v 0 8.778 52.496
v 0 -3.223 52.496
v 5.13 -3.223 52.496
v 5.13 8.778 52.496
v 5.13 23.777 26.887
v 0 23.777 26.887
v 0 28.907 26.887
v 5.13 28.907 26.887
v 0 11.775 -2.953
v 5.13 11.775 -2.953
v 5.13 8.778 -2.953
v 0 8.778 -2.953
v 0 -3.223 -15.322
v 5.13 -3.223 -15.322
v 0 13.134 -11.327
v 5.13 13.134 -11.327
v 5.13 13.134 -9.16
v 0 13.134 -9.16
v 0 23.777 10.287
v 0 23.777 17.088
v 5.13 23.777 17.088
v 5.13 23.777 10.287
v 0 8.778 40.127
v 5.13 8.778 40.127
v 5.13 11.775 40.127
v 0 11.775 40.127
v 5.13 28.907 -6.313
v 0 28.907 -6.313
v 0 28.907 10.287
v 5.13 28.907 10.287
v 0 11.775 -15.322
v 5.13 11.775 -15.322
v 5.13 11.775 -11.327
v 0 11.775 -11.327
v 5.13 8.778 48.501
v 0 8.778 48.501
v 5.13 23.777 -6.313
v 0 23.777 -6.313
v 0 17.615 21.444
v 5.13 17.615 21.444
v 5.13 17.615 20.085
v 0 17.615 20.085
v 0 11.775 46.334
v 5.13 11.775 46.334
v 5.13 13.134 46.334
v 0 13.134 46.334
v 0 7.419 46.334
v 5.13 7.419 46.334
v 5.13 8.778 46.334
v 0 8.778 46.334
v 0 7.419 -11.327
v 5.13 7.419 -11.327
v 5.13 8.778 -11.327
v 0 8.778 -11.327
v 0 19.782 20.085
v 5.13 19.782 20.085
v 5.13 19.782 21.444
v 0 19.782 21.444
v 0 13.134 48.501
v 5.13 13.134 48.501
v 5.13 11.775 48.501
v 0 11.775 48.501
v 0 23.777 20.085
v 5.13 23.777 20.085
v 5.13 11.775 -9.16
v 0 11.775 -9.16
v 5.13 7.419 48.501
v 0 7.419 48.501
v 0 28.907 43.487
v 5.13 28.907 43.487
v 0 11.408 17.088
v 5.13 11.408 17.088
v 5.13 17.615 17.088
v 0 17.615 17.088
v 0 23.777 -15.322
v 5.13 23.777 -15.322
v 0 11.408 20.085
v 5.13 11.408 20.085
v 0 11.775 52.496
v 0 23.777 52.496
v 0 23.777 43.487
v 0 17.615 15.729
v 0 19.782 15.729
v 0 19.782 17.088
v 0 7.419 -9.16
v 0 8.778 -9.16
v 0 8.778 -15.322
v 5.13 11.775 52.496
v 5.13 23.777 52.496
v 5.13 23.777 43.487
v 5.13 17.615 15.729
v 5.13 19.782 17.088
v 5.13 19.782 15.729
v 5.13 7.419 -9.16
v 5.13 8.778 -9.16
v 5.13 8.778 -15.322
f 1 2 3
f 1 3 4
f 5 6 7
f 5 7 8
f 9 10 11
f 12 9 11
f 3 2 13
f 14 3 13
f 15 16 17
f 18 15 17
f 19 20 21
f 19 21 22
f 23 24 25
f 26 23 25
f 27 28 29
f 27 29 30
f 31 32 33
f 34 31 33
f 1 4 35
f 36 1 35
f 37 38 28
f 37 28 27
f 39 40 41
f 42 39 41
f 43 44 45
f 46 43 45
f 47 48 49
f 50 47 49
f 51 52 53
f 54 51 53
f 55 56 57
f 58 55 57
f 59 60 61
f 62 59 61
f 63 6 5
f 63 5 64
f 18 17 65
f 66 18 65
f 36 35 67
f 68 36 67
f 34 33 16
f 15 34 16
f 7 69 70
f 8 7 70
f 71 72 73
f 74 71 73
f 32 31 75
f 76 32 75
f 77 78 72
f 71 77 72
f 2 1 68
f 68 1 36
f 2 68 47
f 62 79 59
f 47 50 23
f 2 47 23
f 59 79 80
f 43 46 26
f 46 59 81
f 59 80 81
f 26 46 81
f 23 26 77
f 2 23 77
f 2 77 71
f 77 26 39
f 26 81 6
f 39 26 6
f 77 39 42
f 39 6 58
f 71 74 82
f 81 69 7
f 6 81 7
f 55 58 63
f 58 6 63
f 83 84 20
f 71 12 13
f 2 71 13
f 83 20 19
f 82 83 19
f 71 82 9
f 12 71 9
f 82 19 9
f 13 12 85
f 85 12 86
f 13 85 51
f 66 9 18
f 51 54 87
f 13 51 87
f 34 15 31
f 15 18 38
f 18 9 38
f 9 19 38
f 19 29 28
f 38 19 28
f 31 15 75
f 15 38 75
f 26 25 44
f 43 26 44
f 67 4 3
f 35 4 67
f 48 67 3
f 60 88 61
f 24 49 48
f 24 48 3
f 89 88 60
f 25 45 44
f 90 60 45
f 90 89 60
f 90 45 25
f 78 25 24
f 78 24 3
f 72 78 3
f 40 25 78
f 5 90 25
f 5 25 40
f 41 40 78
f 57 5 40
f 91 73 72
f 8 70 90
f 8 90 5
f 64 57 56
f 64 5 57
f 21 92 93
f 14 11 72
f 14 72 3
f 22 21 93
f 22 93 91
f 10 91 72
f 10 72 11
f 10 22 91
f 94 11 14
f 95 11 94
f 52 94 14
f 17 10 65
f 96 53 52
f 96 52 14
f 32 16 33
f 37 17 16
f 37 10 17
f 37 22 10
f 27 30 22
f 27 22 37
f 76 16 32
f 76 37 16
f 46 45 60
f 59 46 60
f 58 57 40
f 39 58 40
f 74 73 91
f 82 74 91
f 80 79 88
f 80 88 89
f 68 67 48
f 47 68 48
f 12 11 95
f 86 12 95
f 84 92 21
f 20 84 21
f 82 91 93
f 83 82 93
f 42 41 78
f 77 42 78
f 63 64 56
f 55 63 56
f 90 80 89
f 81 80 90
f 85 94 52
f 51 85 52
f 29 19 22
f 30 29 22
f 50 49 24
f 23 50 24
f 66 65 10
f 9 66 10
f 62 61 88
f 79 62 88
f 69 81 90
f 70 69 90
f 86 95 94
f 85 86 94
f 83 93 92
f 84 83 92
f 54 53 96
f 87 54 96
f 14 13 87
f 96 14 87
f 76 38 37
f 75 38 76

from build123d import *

# Parameters (mm, degrees)
SKETCH2_W               = 67.818
SKETCH2_H               = 27
BOSS_EXTRUDE1_DEPTH     = 5.13
SKETCH3_W               = 5.13
SKETCH3_H               = 16.6
BOSS_EXTRUDE2_DEPTH     = 5.13
CUT_EXTRUDE3_DEPTH      = 1
CUT_EXTRUDE3_DEPTH_BACK = 6.13
T_SLOT_DEPTH            = 1
T_SLOT_DEPTH_BACK       = 6.13
CUT_EXTRUDE6_DEPTH      = 1
CUT_EXTRUDE6_DEPTH_BACK = 6.13


with BuildPart() as part:
    # Sketch2 → Boss-Extrude1 (new body)
    with BuildSketch(Plane(origin=(0, 0, 0), x_dir=(0, 0, -1), z_dir=(1, 0, 0))):
        with Locations((-18.586734769, 10.276959542)):
            Rectangle(SKETCH2_W, SKETCH2_H)
    extrude(amount=BOSS_EXTRUDE1_DEPTH)

    # Sketch3 → Boss-Extrude2 (add)
    with BuildSketch(Plane(origin=(0, 23.776959542, 0), x_dir=(1, 0, 0), z_dir=(0, 1, 0))):
        with Locations((2.565, -1.986734769)):
            Rectangle(SKETCH3_W, SKETCH3_H)
        with Locations((2.565, -35.186734769)):
            Rectangle(SKETCH3_W, SKETCH3_H)
    extrude(amount=BOSS_EXTRUDE2_DEPTH)

    # Sketch6 → Cut-Extrude3 (cut, two sides)
    with BuildSketch(Plane(origin=(5.13, 0, 0), x_dir=(0, 0, -1), z_dir=(1, 0, 0))) as cut_extrude3_sk:
        Polygon((-20.085230125, 122.831802954), (-20.085230125, 23.776960132), (-20.085230125, 19.781960132), (-21.444233122, 19.781960399), (-21.444233548, 17.614960399), (-20.085233548, 17.614960132), (-20.085234769, 11.407960132), (-17.088234769, 11.407959542), (-17.088233548, 17.614959542), (-15.729233548, 17.614959275), (-15.729233122, 19.781959275), (-17.088231927, 19.781959542), (-17.088231927, 23.776959542), (-17.088231927, 122.831802365), (-17.088192956, 320.94148801), (-20.085191154, 320.9414886), align=None)
    extrude(amount=CUT_EXTRUDE3_DEPTH, mode=Mode.SUBTRACT)
    extrude(cut_extrude3_sk.sketch, amount=-CUT_EXTRUDE3_DEPTH_BACK, mode=Mode.SUBTRACT)

    # Sketch4 → t-slot (cut, two sides)
    with BuildSketch(Plane(origin=(5.13, 0, 0), x_dir=(0, 0, -1), z_dir=(1, 0, 0))) as t_slot_sk:
        Polygon((-203.979833818, 8.778464186), (-52.495735359, 8.778464186), (-48.500735359, 8.778464186), (-48.500735626, 7.419461189), (-46.333735626, 7.419460763), (-46.333735359, 8.778460763), (-40.126735359, 8.778459542), (-40.126734769, 11.775459542), (-46.333734769, 11.775460763), (-46.333734502, 13.134460763), (-48.500734502, 13.134461189), (-48.500734769, 11.775462385), (-52.495734769, 11.775462385), (-203.979833229, 11.775462385), (-506.948030149, 11.775521982), (-506.948030738, 8.778523784), align=None)
    extrude(amount=T_SLOT_DEPTH, mode=Mode.SUBTRACT)
    extrude(t_slot_sk.sketch, amount=-T_SLOT_DEPTH_BACK, mode=Mode.SUBTRACT)

    # Sketch7 → Cut-Extrude6 (cut, two sides)
    with BuildSketch(Plane(origin=(5.13, 0, 0), x_dir=(0, 0, -1), z_dir=(1, 0, 0))) as cut_extrude6_sk:
        Polygon((166.806365691, 11.775454898), (15.322265231, 11.775454898), (11.327265231, 11.775454898), (11.327265498, 13.134457895), (9.160265498, 13.134458321), (9.160265231, 11.775458321), (2.953265231, 11.775459542), (2.953264641, 8.778459542), (9.160264641, 8.778458321), (9.160264374, 7.419458321), (11.327264374, 7.419457895), (11.327264641, 8.7784567), (15.322264641, 8.7784567), (166.806365101, 8.7784567), (469.77456602, 8.778397102), (469.77456661, 11.7753953), align=None)
    extrude(amount=CUT_EXTRUDE6_DEPTH, mode=Mode.SUBTRACT)
    extrude(cut_extrude6_sk.sketch, amount=-CUT_EXTRUDE6_DEPTH_BACK, mode=Mode.SUBTRACT)


solid = part.part
